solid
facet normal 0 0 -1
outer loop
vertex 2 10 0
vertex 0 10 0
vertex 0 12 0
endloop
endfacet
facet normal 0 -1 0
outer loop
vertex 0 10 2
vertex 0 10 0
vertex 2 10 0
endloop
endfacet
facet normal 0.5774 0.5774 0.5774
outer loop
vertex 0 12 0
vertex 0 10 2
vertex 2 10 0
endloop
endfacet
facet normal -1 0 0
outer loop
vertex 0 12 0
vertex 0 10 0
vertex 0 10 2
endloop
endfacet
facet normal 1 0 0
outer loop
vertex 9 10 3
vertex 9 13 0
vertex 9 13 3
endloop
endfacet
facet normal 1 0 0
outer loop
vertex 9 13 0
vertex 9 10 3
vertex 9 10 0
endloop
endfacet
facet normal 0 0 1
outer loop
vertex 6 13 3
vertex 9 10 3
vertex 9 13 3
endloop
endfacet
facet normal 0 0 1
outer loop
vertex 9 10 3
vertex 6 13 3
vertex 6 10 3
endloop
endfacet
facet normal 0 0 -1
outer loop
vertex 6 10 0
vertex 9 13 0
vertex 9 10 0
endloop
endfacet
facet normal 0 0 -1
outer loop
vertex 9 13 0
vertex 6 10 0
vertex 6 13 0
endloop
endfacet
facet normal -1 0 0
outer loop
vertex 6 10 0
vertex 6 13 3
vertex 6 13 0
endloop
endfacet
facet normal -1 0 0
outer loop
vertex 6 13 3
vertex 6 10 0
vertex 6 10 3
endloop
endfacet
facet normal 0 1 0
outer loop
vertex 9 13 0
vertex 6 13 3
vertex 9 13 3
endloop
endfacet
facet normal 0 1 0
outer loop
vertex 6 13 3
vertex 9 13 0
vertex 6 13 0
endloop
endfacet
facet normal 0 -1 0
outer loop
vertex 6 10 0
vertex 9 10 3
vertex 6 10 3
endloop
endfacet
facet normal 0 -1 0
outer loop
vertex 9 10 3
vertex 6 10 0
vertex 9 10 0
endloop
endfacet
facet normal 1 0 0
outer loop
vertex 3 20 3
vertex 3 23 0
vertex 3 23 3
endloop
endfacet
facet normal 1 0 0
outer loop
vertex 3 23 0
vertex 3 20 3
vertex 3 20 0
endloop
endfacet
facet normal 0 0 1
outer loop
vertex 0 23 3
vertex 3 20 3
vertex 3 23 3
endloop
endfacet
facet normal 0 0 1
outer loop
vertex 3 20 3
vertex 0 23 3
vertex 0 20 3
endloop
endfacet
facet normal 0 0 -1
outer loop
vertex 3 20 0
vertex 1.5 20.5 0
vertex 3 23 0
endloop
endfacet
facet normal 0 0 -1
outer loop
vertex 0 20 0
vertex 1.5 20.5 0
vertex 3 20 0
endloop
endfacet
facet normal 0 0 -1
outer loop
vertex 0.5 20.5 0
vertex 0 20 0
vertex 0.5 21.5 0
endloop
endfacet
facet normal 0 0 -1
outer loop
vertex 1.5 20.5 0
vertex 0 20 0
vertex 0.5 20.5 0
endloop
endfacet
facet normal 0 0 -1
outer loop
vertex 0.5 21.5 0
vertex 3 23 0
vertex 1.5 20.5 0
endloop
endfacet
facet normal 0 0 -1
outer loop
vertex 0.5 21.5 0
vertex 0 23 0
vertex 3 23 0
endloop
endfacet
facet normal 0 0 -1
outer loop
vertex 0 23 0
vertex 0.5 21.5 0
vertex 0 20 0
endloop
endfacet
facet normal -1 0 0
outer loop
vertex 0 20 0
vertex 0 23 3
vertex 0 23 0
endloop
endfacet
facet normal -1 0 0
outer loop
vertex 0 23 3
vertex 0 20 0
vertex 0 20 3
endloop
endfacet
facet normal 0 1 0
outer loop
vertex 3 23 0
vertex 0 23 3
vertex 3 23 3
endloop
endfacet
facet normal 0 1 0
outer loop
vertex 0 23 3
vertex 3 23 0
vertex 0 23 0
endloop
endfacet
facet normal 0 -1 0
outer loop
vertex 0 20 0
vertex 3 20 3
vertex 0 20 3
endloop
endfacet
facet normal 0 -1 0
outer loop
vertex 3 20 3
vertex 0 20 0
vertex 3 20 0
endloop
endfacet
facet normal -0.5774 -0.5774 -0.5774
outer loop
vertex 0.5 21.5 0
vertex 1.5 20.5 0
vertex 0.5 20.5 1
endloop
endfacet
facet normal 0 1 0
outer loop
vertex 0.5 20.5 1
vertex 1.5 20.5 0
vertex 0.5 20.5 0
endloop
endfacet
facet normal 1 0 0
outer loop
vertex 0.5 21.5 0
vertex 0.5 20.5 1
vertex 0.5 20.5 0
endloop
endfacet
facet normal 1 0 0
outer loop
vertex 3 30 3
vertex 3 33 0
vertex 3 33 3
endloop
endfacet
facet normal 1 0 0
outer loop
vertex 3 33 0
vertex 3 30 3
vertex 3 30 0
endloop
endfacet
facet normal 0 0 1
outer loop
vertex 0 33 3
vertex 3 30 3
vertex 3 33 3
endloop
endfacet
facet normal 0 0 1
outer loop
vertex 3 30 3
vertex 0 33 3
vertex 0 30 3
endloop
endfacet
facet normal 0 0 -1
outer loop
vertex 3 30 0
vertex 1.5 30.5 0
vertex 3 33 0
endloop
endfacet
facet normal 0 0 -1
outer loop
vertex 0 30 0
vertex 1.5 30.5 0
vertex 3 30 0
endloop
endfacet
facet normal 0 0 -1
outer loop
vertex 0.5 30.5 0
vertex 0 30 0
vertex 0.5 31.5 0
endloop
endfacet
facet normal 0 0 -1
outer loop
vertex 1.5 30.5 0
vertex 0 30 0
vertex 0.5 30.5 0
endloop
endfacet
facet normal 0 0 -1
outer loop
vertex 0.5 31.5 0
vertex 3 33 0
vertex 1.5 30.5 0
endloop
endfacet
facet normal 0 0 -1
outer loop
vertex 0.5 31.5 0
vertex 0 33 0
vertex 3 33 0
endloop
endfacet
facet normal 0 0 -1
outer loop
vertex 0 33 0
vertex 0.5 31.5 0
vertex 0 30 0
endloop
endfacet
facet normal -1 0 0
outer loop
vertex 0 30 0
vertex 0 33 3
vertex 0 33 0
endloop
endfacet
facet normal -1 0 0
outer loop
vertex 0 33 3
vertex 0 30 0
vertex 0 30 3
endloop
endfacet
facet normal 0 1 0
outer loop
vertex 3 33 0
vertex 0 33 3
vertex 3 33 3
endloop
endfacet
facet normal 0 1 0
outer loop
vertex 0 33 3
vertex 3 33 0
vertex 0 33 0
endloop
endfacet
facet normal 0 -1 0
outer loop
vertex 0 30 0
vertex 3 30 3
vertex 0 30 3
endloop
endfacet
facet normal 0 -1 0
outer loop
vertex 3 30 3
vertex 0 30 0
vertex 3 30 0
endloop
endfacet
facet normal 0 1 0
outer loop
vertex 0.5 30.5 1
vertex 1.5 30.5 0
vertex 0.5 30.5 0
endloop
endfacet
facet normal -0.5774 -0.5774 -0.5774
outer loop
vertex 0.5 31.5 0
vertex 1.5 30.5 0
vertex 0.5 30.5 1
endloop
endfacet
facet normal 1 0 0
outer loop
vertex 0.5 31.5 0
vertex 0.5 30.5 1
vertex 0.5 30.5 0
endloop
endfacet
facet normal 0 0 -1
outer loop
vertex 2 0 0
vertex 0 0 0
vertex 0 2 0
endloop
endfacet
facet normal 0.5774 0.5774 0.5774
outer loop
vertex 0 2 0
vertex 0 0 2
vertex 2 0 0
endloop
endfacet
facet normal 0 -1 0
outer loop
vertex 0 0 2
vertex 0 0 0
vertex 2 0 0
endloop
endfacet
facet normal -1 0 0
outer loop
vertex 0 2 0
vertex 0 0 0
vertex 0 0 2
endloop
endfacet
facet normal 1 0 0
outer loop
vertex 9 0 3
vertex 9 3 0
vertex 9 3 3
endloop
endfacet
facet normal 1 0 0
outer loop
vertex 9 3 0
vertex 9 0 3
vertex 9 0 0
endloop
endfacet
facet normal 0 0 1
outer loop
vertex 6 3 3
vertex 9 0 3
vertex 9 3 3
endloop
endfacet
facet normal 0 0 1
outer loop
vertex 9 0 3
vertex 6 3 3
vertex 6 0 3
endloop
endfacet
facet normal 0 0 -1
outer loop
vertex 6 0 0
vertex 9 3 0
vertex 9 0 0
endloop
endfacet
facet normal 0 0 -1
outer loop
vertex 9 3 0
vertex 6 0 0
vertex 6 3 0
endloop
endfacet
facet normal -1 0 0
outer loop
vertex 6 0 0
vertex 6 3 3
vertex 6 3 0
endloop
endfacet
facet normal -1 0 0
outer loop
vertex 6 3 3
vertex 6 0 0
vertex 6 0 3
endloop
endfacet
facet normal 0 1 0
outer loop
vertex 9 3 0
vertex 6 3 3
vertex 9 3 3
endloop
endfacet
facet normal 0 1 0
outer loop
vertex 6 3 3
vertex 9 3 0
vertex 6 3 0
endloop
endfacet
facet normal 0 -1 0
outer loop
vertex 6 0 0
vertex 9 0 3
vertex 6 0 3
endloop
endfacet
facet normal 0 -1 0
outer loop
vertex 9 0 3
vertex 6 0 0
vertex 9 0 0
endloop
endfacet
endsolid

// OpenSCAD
// OpenSCAD winds a face clockwise seen from outside. The same tetrahedron is
// written both ways below: the second block is inside-out. A lone inside-out
// solid exports with its normals reversed in both engines, but once it reaches
// the CSG kernel it is a positive solid, so it *adds* under union and *cuts*
// under difference rather than doing the reverse.
tetra = [[0,0,0],[2,0,0],[0,2,0],[0,0,2]];
out = [[0,1,2],[0,3,1],[1,3,2],[0,2,3]];   // as documented
inv = [[0,2,1],[0,1,3],[1,2,3],[0,3,2]];   // inside-out

polyhedron(tetra, out);                    // union of two disjoint solids
translate([6,0,0]) cube(3);

translate([0,10,0]) {
  polyhedron(tetra, inv);                  // same, but inside-out: still adds
  translate([6,0,0]) cube(3);
}

translate([0,20,0]) difference() { cube(3); translate([0.5,0.5,-1]) polyhedron(tetra, out); }
translate([0,30,0]) difference() { cube(3); translate([0.5,0.5,-1]) polyhedron(tetra, inv); }
